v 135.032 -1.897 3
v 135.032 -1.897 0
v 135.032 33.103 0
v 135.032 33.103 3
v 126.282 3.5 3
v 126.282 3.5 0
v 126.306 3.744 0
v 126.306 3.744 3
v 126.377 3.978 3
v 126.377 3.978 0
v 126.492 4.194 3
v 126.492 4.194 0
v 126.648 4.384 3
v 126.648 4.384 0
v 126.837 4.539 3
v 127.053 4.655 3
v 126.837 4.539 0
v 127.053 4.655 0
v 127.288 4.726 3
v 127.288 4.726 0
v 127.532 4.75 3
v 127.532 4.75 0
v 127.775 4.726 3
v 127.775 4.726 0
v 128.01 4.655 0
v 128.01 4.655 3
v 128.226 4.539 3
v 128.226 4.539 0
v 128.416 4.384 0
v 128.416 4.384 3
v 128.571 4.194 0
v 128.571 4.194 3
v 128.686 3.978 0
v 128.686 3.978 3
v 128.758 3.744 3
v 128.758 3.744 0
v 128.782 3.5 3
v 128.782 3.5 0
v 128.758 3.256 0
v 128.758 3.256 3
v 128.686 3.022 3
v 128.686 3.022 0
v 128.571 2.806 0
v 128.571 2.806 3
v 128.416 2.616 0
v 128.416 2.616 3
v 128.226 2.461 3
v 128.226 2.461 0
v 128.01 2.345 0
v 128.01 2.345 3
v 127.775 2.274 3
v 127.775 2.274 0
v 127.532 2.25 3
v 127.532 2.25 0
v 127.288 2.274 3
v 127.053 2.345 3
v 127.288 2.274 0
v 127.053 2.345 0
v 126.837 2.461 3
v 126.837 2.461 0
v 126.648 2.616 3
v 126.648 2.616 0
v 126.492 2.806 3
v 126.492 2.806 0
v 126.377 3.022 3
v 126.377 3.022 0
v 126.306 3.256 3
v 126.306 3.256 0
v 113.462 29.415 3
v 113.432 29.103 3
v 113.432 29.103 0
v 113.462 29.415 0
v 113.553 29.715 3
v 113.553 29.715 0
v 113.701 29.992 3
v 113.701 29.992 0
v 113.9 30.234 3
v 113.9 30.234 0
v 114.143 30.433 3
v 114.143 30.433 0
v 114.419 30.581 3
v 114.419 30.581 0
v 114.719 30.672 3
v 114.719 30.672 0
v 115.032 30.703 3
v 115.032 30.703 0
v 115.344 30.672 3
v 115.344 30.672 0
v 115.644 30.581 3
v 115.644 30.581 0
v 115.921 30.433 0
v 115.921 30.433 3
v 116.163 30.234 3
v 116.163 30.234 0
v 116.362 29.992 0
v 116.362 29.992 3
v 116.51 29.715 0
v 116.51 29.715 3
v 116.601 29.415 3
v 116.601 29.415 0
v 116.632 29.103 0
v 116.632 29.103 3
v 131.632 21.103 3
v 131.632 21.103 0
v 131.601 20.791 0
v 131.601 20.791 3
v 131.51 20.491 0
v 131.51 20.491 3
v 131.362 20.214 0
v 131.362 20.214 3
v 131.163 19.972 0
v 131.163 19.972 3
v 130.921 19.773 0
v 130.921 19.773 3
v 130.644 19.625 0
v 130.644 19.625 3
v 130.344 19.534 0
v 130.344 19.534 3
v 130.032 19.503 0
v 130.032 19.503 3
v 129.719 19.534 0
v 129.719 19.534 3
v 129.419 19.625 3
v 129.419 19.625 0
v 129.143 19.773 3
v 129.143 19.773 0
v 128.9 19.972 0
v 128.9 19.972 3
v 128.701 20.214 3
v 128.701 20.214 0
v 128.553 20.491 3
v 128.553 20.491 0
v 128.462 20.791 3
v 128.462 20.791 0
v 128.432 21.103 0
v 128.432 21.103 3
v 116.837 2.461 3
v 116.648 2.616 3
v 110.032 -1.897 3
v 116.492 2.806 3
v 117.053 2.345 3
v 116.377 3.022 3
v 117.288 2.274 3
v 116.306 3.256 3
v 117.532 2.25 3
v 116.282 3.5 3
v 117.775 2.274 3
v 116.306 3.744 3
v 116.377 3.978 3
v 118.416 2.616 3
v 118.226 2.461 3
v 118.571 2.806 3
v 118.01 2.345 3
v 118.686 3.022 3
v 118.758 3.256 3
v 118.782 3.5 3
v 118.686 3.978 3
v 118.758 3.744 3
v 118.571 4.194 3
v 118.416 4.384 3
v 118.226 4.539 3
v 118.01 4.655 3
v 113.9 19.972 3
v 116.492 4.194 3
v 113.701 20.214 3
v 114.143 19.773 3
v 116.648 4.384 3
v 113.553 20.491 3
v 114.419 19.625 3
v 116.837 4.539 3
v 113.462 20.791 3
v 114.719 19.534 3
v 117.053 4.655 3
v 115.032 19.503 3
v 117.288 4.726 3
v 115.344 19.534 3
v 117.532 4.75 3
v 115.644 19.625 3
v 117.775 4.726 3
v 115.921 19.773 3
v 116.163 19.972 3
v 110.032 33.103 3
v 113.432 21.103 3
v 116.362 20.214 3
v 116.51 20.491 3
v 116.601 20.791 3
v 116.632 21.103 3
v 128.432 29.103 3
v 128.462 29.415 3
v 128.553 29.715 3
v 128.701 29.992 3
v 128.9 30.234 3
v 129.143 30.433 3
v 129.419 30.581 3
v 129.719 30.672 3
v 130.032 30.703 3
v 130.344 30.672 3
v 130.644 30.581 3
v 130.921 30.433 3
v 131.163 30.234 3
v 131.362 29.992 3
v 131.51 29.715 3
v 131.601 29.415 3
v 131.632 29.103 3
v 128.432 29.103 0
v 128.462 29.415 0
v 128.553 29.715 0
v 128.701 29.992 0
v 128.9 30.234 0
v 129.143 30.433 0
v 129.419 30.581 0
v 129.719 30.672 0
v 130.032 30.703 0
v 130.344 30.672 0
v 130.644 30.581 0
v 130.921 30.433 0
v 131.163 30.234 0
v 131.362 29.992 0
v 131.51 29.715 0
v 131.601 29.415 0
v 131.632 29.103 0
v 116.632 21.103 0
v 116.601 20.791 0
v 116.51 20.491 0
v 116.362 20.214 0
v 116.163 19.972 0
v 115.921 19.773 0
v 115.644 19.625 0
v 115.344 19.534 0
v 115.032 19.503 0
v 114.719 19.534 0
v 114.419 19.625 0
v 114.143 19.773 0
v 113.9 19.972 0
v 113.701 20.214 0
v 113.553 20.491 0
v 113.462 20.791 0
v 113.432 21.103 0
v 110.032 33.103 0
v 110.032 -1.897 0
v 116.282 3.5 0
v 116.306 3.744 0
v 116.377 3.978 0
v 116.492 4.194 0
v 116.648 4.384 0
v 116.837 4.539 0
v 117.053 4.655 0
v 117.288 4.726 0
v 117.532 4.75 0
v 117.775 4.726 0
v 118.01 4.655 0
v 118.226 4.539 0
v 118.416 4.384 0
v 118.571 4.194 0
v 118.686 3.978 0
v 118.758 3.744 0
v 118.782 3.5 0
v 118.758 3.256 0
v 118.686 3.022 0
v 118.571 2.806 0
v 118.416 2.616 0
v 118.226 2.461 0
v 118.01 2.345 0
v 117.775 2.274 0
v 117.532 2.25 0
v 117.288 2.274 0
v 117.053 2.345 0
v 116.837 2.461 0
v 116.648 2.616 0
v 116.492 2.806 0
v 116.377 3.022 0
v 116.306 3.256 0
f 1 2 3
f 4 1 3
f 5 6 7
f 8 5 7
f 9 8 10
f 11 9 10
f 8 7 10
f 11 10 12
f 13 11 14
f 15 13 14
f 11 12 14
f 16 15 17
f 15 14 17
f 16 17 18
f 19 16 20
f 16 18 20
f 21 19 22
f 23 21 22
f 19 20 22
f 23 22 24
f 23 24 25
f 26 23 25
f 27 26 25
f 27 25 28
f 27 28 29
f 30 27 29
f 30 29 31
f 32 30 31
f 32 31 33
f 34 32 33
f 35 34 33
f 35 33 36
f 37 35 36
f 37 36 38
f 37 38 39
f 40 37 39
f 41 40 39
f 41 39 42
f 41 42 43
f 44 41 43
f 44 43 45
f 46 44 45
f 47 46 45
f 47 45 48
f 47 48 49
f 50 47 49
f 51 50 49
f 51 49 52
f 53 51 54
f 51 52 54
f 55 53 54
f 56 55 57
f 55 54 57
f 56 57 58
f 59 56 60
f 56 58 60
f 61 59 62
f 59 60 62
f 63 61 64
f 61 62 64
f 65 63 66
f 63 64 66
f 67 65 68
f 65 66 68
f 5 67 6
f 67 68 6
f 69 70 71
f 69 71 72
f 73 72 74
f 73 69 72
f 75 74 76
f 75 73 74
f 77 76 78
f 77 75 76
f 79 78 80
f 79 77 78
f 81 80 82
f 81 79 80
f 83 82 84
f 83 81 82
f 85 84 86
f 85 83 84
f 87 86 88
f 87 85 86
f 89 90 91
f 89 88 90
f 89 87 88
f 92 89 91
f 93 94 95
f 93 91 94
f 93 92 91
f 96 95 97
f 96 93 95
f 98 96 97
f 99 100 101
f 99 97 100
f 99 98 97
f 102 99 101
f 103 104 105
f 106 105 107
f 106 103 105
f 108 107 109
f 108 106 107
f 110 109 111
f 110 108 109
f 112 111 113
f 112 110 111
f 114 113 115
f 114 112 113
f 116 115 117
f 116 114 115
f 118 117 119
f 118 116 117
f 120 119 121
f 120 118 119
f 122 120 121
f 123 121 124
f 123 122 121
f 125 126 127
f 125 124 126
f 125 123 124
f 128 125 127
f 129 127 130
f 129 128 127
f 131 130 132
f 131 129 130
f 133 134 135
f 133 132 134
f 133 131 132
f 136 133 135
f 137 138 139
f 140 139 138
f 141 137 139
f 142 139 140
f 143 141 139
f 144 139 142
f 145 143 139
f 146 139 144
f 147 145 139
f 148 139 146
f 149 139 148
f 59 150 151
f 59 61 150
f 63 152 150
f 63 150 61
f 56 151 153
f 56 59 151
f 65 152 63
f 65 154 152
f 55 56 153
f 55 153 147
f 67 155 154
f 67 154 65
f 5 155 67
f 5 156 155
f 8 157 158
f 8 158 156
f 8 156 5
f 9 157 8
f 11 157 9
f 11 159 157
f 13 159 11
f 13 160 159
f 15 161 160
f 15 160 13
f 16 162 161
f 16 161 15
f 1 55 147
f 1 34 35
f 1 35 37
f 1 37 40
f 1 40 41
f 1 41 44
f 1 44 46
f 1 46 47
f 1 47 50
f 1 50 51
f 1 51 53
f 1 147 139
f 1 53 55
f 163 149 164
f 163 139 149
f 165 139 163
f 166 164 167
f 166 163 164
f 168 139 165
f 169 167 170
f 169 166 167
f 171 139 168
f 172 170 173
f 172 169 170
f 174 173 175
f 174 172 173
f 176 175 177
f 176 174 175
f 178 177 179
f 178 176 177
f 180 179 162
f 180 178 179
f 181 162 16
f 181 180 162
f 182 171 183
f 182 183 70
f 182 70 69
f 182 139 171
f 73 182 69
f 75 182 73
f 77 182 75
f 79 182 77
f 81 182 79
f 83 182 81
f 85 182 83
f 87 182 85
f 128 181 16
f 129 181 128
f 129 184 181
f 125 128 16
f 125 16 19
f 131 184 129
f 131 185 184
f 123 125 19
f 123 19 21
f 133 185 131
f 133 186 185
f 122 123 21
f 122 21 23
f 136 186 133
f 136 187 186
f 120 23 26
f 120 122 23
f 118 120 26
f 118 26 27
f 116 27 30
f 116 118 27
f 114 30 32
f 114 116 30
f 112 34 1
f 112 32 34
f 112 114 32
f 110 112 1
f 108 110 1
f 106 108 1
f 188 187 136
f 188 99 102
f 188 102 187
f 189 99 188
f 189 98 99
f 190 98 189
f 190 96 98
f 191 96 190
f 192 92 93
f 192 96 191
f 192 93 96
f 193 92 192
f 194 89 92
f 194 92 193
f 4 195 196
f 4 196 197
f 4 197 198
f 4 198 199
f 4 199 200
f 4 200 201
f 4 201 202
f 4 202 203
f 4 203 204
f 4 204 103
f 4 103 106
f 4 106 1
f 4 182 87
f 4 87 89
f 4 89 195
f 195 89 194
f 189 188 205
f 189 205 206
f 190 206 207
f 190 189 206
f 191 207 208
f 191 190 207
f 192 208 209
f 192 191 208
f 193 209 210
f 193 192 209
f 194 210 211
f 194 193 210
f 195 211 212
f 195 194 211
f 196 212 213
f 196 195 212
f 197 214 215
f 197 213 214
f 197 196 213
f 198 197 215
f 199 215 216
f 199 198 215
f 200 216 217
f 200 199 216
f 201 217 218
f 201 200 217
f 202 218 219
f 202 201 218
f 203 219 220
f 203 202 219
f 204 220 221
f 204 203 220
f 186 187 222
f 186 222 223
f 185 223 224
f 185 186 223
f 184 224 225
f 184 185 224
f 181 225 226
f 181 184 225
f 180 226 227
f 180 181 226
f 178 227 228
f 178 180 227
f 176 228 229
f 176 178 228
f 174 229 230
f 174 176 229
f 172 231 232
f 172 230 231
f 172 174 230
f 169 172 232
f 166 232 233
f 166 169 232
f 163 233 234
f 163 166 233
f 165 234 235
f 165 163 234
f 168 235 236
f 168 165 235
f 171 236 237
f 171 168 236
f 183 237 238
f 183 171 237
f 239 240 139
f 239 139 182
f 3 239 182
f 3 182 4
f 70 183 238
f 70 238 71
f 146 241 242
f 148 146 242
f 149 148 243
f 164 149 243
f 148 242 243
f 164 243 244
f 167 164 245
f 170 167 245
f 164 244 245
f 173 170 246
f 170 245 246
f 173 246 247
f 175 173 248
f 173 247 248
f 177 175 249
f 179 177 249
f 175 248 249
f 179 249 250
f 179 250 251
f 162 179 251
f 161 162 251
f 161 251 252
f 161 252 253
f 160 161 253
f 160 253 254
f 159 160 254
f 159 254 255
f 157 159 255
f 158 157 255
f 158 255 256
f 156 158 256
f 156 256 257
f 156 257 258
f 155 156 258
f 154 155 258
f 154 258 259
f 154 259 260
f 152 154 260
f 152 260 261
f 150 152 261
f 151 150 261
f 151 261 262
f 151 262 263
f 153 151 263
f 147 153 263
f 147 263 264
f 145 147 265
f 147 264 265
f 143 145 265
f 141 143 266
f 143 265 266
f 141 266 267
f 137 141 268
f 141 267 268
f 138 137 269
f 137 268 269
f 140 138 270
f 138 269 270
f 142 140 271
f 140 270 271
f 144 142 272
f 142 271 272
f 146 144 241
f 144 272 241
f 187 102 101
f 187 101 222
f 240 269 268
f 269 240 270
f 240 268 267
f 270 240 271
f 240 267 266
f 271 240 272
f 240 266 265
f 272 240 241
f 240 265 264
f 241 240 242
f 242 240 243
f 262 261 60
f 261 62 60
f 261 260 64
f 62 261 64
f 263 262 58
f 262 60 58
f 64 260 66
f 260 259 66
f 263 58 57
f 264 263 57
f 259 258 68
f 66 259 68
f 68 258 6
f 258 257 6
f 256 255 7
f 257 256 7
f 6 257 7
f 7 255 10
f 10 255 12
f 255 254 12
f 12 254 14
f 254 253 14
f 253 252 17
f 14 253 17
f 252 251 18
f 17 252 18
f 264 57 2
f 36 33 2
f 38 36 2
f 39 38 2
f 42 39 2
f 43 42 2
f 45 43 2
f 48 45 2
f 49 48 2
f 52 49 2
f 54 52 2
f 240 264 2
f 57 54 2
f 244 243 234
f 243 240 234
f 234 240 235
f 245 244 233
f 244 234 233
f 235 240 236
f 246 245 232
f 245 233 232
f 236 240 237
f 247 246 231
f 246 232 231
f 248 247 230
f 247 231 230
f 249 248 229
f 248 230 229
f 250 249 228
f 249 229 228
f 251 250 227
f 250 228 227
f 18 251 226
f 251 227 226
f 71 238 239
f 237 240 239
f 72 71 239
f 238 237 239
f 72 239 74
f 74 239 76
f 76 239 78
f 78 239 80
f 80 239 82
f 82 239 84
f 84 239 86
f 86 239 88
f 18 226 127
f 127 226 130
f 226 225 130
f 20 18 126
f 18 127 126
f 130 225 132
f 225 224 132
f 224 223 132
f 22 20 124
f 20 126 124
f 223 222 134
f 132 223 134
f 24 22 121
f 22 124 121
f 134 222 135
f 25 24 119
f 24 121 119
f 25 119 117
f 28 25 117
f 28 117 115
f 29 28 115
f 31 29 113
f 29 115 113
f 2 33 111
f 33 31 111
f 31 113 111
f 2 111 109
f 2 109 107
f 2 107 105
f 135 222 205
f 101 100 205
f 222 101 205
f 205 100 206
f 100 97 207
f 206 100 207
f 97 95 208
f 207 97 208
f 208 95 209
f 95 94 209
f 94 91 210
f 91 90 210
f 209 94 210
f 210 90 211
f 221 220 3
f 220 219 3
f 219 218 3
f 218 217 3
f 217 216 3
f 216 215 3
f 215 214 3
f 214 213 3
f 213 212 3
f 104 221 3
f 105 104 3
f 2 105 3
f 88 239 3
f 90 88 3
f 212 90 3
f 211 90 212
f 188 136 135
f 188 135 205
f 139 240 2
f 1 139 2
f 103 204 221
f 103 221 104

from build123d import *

# Parameters (mm, degrees)
SKETCH_1_W          = 25
SKETCH_1_H          = 35
EXTRUDE_1_DEPTH     = 3
M3X0_5_1_D          = 2.5
CUT_EXTRUDE_1_DEPTH = 140.062386204


with BuildPart() as part:
    # 草图1 → 凸台-拉伸1 (new body)
    with BuildSketch(Plane.XY):
        with Locations((122.531636064, 15.602938216)):
            Rectangle(SKETCH_1_W, SKETCH_1_H)
    extrude(amount=EXTRUDE_1_DEPTH)

    # M3x0.5 螺纹孔1 (through all)
    with Locations(Plane.XY.offset(3)):
        with Locations((117.531636064, 3.5), (127.531636064, 3.5)):
            Hole(M3X0_5_1_D / 2)

    # 草图4 → 切除-拉伸1 (cut, through all)
    with BuildSketch(Plane.XY.offset(3)):
        with BuildLine():
            Line((116.631636064, 29.102938216), (116.631636064, 21.102938216))
            ThreePointArc((116.631636064, 21.102938216), (115.031636064, 19.502938216), (113.431636064, 21.102938216))
            Line((113.431636064, 21.102938216), (113.431636064, 29.102938216))
            ThreePointArc((113.431636064, 29.102938216), (115.031636064, 30.702938216), (116.631636064, 29.102938216))
        make_face()
        with BuildLine():
            Line((131.631636064, 29.102938216), (131.631636064, 21.102938216))
            ThreePointArc((131.631636064, 21.102938216), (130.031636064, 19.502938216), (128.431636064, 21.102938216))
            Line((128.431636064, 21.102938216), (128.431636064, 29.102938216))
            ThreePointArc((128.431636064, 29.102938216), (130.031636064, 30.702938216), (131.631636064, 29.102938216))
        make_face()
    extrude(amount=-CUT_EXTRUDE_1_DEPTH, mode=Mode.SUBTRACT)


solid = part.part
